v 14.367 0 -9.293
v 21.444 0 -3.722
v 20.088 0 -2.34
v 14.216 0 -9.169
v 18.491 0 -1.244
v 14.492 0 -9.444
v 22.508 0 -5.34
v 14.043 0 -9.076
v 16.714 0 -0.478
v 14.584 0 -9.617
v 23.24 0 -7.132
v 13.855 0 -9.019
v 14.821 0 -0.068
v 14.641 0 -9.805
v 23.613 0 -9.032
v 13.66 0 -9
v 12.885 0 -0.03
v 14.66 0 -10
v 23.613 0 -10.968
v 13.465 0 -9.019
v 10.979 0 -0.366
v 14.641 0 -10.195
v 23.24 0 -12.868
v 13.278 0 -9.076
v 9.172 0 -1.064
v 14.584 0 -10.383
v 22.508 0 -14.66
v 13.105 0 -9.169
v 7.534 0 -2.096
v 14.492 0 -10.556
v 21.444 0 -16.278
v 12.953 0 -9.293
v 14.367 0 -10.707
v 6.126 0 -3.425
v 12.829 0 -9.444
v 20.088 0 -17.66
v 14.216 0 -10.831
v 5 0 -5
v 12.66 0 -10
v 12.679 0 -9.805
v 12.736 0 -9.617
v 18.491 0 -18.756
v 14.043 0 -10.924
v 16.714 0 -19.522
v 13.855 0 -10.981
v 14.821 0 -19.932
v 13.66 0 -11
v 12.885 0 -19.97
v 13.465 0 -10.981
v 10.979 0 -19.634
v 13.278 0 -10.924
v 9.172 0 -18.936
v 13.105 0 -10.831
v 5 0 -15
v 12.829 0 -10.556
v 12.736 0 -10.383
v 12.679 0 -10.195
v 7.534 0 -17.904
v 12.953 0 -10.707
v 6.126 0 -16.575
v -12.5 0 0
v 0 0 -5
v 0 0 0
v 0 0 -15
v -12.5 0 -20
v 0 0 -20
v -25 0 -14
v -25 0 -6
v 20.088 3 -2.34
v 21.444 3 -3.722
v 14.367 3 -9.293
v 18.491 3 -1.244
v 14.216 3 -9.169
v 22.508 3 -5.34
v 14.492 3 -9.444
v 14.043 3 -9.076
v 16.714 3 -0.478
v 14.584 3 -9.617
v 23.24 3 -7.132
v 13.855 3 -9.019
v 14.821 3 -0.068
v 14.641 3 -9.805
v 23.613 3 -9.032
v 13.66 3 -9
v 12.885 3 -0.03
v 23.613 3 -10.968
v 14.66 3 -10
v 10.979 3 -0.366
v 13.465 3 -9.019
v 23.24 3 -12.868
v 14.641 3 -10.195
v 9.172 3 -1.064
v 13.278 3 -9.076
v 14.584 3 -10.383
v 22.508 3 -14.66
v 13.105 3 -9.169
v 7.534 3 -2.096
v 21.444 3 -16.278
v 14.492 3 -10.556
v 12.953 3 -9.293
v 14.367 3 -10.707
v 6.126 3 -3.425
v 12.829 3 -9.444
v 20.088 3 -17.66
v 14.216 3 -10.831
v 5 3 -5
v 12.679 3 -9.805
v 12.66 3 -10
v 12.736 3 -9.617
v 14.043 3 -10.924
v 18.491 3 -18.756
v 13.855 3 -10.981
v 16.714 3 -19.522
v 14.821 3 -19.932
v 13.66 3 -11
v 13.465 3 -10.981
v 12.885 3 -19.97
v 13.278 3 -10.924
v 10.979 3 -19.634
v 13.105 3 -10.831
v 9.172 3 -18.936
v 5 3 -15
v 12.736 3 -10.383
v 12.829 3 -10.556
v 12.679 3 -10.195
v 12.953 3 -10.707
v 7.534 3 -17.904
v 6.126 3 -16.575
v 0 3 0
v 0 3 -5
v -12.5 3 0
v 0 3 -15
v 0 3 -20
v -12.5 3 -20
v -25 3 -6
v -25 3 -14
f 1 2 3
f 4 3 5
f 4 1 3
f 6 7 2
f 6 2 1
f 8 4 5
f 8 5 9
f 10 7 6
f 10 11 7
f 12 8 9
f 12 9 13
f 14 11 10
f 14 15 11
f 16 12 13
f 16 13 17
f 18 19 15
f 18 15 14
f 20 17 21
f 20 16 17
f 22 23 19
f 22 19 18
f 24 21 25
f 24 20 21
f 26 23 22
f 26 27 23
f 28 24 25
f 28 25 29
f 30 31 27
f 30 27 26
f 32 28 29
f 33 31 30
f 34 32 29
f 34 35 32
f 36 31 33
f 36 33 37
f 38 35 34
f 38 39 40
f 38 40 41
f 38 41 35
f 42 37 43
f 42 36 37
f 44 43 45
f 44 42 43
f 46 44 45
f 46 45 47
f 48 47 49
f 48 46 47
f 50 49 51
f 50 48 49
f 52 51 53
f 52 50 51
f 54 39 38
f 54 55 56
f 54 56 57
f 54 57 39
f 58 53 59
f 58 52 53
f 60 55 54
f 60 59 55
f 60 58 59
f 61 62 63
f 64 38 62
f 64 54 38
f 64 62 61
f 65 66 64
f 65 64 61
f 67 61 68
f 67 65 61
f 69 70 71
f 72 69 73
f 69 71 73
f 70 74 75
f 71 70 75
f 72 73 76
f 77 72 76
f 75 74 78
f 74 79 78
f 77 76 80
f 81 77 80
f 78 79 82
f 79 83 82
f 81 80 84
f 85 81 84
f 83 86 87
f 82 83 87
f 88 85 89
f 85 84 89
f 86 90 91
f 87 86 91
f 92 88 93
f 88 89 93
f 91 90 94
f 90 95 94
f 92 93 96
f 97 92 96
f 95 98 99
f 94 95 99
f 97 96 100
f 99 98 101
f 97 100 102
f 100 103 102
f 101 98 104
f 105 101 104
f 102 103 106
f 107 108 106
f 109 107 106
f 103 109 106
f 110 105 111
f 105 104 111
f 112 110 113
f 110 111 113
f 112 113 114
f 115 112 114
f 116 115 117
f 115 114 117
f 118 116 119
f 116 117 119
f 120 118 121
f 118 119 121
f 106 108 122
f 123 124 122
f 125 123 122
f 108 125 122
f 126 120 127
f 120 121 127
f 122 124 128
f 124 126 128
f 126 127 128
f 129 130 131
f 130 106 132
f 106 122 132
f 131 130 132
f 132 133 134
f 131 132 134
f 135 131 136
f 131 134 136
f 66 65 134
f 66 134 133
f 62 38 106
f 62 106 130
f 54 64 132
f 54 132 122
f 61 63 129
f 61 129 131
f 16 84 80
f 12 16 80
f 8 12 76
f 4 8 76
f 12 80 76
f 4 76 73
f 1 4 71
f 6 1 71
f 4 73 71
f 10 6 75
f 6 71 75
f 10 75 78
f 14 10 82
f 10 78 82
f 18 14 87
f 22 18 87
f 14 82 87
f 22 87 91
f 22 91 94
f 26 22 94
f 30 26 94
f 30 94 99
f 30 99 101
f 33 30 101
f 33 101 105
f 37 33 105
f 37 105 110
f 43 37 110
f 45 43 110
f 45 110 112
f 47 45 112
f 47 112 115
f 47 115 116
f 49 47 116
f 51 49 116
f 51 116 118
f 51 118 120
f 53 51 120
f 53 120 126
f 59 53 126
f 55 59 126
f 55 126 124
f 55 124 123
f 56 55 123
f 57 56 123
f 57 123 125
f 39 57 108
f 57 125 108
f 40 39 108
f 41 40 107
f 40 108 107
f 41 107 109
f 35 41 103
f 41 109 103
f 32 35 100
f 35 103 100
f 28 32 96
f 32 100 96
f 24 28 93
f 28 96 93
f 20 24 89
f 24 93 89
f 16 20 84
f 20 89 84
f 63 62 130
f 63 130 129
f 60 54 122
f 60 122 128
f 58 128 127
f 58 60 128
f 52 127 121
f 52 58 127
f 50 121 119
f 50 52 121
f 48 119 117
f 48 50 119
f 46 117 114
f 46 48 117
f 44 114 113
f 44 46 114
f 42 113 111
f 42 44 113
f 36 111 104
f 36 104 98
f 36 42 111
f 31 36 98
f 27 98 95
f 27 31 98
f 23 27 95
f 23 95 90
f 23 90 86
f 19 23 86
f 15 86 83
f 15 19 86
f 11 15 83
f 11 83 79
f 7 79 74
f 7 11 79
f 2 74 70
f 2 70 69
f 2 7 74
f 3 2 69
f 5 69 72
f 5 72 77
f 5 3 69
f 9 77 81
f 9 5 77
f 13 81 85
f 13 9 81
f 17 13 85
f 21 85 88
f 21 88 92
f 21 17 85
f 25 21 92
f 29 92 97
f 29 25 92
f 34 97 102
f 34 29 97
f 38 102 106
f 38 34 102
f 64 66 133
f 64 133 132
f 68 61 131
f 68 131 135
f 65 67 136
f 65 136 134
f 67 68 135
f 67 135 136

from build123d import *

# Parameters (mm, degrees)
BOSS_EXTRUDE1_DEPTH = 3
SKETCH2_R           = 1
CUT_EXTRUDE1_DEPTH  = 13


with BuildPart() as part:
    # Sketch1 → Boss-Extrude1 (new body)
    with BuildSketch(Plane(origin=(0, 0, 0), x_dir=(1, 0, 0), z_dir=(0, 1, 0))):
        with BuildLine():
            Line((-12.5, 0), (-25, 6))
            Line((-25, 6), (-25, 14))
            Line((-25, 14), (-12.5, 20))
            Line((-12.5, 20), (0, 20))
            Line((0, 20), (0, 15))
            Line((0, 15), (5, 15))
            ThreePointArc((5, 15), (23.660254038, 10), (5, 5))
            Line((5, 5), (0, 5))
            Line((0, 5), (0, 0))
            Line((0, 0), (-12.5, 0))
        make_face()
    extrude(amount=BOSS_EXTRUDE1_DEPTH)

    # Sketch2 → Cut-Extrude1 (cut)
    with BuildSketch(Plane(origin=(0, 3, 0), x_dir=(1, 0, 0), z_dir=(0, 1, 0))):
        with Locations(Location((13.660254038, 10, 0), (0, 0, 270))):
            Circle(SKETCH2_R)
    extrude(amount=-CUT_EXTRUDE1_DEPTH, mode=Mode.SUBTRACT)


solid = part.part
